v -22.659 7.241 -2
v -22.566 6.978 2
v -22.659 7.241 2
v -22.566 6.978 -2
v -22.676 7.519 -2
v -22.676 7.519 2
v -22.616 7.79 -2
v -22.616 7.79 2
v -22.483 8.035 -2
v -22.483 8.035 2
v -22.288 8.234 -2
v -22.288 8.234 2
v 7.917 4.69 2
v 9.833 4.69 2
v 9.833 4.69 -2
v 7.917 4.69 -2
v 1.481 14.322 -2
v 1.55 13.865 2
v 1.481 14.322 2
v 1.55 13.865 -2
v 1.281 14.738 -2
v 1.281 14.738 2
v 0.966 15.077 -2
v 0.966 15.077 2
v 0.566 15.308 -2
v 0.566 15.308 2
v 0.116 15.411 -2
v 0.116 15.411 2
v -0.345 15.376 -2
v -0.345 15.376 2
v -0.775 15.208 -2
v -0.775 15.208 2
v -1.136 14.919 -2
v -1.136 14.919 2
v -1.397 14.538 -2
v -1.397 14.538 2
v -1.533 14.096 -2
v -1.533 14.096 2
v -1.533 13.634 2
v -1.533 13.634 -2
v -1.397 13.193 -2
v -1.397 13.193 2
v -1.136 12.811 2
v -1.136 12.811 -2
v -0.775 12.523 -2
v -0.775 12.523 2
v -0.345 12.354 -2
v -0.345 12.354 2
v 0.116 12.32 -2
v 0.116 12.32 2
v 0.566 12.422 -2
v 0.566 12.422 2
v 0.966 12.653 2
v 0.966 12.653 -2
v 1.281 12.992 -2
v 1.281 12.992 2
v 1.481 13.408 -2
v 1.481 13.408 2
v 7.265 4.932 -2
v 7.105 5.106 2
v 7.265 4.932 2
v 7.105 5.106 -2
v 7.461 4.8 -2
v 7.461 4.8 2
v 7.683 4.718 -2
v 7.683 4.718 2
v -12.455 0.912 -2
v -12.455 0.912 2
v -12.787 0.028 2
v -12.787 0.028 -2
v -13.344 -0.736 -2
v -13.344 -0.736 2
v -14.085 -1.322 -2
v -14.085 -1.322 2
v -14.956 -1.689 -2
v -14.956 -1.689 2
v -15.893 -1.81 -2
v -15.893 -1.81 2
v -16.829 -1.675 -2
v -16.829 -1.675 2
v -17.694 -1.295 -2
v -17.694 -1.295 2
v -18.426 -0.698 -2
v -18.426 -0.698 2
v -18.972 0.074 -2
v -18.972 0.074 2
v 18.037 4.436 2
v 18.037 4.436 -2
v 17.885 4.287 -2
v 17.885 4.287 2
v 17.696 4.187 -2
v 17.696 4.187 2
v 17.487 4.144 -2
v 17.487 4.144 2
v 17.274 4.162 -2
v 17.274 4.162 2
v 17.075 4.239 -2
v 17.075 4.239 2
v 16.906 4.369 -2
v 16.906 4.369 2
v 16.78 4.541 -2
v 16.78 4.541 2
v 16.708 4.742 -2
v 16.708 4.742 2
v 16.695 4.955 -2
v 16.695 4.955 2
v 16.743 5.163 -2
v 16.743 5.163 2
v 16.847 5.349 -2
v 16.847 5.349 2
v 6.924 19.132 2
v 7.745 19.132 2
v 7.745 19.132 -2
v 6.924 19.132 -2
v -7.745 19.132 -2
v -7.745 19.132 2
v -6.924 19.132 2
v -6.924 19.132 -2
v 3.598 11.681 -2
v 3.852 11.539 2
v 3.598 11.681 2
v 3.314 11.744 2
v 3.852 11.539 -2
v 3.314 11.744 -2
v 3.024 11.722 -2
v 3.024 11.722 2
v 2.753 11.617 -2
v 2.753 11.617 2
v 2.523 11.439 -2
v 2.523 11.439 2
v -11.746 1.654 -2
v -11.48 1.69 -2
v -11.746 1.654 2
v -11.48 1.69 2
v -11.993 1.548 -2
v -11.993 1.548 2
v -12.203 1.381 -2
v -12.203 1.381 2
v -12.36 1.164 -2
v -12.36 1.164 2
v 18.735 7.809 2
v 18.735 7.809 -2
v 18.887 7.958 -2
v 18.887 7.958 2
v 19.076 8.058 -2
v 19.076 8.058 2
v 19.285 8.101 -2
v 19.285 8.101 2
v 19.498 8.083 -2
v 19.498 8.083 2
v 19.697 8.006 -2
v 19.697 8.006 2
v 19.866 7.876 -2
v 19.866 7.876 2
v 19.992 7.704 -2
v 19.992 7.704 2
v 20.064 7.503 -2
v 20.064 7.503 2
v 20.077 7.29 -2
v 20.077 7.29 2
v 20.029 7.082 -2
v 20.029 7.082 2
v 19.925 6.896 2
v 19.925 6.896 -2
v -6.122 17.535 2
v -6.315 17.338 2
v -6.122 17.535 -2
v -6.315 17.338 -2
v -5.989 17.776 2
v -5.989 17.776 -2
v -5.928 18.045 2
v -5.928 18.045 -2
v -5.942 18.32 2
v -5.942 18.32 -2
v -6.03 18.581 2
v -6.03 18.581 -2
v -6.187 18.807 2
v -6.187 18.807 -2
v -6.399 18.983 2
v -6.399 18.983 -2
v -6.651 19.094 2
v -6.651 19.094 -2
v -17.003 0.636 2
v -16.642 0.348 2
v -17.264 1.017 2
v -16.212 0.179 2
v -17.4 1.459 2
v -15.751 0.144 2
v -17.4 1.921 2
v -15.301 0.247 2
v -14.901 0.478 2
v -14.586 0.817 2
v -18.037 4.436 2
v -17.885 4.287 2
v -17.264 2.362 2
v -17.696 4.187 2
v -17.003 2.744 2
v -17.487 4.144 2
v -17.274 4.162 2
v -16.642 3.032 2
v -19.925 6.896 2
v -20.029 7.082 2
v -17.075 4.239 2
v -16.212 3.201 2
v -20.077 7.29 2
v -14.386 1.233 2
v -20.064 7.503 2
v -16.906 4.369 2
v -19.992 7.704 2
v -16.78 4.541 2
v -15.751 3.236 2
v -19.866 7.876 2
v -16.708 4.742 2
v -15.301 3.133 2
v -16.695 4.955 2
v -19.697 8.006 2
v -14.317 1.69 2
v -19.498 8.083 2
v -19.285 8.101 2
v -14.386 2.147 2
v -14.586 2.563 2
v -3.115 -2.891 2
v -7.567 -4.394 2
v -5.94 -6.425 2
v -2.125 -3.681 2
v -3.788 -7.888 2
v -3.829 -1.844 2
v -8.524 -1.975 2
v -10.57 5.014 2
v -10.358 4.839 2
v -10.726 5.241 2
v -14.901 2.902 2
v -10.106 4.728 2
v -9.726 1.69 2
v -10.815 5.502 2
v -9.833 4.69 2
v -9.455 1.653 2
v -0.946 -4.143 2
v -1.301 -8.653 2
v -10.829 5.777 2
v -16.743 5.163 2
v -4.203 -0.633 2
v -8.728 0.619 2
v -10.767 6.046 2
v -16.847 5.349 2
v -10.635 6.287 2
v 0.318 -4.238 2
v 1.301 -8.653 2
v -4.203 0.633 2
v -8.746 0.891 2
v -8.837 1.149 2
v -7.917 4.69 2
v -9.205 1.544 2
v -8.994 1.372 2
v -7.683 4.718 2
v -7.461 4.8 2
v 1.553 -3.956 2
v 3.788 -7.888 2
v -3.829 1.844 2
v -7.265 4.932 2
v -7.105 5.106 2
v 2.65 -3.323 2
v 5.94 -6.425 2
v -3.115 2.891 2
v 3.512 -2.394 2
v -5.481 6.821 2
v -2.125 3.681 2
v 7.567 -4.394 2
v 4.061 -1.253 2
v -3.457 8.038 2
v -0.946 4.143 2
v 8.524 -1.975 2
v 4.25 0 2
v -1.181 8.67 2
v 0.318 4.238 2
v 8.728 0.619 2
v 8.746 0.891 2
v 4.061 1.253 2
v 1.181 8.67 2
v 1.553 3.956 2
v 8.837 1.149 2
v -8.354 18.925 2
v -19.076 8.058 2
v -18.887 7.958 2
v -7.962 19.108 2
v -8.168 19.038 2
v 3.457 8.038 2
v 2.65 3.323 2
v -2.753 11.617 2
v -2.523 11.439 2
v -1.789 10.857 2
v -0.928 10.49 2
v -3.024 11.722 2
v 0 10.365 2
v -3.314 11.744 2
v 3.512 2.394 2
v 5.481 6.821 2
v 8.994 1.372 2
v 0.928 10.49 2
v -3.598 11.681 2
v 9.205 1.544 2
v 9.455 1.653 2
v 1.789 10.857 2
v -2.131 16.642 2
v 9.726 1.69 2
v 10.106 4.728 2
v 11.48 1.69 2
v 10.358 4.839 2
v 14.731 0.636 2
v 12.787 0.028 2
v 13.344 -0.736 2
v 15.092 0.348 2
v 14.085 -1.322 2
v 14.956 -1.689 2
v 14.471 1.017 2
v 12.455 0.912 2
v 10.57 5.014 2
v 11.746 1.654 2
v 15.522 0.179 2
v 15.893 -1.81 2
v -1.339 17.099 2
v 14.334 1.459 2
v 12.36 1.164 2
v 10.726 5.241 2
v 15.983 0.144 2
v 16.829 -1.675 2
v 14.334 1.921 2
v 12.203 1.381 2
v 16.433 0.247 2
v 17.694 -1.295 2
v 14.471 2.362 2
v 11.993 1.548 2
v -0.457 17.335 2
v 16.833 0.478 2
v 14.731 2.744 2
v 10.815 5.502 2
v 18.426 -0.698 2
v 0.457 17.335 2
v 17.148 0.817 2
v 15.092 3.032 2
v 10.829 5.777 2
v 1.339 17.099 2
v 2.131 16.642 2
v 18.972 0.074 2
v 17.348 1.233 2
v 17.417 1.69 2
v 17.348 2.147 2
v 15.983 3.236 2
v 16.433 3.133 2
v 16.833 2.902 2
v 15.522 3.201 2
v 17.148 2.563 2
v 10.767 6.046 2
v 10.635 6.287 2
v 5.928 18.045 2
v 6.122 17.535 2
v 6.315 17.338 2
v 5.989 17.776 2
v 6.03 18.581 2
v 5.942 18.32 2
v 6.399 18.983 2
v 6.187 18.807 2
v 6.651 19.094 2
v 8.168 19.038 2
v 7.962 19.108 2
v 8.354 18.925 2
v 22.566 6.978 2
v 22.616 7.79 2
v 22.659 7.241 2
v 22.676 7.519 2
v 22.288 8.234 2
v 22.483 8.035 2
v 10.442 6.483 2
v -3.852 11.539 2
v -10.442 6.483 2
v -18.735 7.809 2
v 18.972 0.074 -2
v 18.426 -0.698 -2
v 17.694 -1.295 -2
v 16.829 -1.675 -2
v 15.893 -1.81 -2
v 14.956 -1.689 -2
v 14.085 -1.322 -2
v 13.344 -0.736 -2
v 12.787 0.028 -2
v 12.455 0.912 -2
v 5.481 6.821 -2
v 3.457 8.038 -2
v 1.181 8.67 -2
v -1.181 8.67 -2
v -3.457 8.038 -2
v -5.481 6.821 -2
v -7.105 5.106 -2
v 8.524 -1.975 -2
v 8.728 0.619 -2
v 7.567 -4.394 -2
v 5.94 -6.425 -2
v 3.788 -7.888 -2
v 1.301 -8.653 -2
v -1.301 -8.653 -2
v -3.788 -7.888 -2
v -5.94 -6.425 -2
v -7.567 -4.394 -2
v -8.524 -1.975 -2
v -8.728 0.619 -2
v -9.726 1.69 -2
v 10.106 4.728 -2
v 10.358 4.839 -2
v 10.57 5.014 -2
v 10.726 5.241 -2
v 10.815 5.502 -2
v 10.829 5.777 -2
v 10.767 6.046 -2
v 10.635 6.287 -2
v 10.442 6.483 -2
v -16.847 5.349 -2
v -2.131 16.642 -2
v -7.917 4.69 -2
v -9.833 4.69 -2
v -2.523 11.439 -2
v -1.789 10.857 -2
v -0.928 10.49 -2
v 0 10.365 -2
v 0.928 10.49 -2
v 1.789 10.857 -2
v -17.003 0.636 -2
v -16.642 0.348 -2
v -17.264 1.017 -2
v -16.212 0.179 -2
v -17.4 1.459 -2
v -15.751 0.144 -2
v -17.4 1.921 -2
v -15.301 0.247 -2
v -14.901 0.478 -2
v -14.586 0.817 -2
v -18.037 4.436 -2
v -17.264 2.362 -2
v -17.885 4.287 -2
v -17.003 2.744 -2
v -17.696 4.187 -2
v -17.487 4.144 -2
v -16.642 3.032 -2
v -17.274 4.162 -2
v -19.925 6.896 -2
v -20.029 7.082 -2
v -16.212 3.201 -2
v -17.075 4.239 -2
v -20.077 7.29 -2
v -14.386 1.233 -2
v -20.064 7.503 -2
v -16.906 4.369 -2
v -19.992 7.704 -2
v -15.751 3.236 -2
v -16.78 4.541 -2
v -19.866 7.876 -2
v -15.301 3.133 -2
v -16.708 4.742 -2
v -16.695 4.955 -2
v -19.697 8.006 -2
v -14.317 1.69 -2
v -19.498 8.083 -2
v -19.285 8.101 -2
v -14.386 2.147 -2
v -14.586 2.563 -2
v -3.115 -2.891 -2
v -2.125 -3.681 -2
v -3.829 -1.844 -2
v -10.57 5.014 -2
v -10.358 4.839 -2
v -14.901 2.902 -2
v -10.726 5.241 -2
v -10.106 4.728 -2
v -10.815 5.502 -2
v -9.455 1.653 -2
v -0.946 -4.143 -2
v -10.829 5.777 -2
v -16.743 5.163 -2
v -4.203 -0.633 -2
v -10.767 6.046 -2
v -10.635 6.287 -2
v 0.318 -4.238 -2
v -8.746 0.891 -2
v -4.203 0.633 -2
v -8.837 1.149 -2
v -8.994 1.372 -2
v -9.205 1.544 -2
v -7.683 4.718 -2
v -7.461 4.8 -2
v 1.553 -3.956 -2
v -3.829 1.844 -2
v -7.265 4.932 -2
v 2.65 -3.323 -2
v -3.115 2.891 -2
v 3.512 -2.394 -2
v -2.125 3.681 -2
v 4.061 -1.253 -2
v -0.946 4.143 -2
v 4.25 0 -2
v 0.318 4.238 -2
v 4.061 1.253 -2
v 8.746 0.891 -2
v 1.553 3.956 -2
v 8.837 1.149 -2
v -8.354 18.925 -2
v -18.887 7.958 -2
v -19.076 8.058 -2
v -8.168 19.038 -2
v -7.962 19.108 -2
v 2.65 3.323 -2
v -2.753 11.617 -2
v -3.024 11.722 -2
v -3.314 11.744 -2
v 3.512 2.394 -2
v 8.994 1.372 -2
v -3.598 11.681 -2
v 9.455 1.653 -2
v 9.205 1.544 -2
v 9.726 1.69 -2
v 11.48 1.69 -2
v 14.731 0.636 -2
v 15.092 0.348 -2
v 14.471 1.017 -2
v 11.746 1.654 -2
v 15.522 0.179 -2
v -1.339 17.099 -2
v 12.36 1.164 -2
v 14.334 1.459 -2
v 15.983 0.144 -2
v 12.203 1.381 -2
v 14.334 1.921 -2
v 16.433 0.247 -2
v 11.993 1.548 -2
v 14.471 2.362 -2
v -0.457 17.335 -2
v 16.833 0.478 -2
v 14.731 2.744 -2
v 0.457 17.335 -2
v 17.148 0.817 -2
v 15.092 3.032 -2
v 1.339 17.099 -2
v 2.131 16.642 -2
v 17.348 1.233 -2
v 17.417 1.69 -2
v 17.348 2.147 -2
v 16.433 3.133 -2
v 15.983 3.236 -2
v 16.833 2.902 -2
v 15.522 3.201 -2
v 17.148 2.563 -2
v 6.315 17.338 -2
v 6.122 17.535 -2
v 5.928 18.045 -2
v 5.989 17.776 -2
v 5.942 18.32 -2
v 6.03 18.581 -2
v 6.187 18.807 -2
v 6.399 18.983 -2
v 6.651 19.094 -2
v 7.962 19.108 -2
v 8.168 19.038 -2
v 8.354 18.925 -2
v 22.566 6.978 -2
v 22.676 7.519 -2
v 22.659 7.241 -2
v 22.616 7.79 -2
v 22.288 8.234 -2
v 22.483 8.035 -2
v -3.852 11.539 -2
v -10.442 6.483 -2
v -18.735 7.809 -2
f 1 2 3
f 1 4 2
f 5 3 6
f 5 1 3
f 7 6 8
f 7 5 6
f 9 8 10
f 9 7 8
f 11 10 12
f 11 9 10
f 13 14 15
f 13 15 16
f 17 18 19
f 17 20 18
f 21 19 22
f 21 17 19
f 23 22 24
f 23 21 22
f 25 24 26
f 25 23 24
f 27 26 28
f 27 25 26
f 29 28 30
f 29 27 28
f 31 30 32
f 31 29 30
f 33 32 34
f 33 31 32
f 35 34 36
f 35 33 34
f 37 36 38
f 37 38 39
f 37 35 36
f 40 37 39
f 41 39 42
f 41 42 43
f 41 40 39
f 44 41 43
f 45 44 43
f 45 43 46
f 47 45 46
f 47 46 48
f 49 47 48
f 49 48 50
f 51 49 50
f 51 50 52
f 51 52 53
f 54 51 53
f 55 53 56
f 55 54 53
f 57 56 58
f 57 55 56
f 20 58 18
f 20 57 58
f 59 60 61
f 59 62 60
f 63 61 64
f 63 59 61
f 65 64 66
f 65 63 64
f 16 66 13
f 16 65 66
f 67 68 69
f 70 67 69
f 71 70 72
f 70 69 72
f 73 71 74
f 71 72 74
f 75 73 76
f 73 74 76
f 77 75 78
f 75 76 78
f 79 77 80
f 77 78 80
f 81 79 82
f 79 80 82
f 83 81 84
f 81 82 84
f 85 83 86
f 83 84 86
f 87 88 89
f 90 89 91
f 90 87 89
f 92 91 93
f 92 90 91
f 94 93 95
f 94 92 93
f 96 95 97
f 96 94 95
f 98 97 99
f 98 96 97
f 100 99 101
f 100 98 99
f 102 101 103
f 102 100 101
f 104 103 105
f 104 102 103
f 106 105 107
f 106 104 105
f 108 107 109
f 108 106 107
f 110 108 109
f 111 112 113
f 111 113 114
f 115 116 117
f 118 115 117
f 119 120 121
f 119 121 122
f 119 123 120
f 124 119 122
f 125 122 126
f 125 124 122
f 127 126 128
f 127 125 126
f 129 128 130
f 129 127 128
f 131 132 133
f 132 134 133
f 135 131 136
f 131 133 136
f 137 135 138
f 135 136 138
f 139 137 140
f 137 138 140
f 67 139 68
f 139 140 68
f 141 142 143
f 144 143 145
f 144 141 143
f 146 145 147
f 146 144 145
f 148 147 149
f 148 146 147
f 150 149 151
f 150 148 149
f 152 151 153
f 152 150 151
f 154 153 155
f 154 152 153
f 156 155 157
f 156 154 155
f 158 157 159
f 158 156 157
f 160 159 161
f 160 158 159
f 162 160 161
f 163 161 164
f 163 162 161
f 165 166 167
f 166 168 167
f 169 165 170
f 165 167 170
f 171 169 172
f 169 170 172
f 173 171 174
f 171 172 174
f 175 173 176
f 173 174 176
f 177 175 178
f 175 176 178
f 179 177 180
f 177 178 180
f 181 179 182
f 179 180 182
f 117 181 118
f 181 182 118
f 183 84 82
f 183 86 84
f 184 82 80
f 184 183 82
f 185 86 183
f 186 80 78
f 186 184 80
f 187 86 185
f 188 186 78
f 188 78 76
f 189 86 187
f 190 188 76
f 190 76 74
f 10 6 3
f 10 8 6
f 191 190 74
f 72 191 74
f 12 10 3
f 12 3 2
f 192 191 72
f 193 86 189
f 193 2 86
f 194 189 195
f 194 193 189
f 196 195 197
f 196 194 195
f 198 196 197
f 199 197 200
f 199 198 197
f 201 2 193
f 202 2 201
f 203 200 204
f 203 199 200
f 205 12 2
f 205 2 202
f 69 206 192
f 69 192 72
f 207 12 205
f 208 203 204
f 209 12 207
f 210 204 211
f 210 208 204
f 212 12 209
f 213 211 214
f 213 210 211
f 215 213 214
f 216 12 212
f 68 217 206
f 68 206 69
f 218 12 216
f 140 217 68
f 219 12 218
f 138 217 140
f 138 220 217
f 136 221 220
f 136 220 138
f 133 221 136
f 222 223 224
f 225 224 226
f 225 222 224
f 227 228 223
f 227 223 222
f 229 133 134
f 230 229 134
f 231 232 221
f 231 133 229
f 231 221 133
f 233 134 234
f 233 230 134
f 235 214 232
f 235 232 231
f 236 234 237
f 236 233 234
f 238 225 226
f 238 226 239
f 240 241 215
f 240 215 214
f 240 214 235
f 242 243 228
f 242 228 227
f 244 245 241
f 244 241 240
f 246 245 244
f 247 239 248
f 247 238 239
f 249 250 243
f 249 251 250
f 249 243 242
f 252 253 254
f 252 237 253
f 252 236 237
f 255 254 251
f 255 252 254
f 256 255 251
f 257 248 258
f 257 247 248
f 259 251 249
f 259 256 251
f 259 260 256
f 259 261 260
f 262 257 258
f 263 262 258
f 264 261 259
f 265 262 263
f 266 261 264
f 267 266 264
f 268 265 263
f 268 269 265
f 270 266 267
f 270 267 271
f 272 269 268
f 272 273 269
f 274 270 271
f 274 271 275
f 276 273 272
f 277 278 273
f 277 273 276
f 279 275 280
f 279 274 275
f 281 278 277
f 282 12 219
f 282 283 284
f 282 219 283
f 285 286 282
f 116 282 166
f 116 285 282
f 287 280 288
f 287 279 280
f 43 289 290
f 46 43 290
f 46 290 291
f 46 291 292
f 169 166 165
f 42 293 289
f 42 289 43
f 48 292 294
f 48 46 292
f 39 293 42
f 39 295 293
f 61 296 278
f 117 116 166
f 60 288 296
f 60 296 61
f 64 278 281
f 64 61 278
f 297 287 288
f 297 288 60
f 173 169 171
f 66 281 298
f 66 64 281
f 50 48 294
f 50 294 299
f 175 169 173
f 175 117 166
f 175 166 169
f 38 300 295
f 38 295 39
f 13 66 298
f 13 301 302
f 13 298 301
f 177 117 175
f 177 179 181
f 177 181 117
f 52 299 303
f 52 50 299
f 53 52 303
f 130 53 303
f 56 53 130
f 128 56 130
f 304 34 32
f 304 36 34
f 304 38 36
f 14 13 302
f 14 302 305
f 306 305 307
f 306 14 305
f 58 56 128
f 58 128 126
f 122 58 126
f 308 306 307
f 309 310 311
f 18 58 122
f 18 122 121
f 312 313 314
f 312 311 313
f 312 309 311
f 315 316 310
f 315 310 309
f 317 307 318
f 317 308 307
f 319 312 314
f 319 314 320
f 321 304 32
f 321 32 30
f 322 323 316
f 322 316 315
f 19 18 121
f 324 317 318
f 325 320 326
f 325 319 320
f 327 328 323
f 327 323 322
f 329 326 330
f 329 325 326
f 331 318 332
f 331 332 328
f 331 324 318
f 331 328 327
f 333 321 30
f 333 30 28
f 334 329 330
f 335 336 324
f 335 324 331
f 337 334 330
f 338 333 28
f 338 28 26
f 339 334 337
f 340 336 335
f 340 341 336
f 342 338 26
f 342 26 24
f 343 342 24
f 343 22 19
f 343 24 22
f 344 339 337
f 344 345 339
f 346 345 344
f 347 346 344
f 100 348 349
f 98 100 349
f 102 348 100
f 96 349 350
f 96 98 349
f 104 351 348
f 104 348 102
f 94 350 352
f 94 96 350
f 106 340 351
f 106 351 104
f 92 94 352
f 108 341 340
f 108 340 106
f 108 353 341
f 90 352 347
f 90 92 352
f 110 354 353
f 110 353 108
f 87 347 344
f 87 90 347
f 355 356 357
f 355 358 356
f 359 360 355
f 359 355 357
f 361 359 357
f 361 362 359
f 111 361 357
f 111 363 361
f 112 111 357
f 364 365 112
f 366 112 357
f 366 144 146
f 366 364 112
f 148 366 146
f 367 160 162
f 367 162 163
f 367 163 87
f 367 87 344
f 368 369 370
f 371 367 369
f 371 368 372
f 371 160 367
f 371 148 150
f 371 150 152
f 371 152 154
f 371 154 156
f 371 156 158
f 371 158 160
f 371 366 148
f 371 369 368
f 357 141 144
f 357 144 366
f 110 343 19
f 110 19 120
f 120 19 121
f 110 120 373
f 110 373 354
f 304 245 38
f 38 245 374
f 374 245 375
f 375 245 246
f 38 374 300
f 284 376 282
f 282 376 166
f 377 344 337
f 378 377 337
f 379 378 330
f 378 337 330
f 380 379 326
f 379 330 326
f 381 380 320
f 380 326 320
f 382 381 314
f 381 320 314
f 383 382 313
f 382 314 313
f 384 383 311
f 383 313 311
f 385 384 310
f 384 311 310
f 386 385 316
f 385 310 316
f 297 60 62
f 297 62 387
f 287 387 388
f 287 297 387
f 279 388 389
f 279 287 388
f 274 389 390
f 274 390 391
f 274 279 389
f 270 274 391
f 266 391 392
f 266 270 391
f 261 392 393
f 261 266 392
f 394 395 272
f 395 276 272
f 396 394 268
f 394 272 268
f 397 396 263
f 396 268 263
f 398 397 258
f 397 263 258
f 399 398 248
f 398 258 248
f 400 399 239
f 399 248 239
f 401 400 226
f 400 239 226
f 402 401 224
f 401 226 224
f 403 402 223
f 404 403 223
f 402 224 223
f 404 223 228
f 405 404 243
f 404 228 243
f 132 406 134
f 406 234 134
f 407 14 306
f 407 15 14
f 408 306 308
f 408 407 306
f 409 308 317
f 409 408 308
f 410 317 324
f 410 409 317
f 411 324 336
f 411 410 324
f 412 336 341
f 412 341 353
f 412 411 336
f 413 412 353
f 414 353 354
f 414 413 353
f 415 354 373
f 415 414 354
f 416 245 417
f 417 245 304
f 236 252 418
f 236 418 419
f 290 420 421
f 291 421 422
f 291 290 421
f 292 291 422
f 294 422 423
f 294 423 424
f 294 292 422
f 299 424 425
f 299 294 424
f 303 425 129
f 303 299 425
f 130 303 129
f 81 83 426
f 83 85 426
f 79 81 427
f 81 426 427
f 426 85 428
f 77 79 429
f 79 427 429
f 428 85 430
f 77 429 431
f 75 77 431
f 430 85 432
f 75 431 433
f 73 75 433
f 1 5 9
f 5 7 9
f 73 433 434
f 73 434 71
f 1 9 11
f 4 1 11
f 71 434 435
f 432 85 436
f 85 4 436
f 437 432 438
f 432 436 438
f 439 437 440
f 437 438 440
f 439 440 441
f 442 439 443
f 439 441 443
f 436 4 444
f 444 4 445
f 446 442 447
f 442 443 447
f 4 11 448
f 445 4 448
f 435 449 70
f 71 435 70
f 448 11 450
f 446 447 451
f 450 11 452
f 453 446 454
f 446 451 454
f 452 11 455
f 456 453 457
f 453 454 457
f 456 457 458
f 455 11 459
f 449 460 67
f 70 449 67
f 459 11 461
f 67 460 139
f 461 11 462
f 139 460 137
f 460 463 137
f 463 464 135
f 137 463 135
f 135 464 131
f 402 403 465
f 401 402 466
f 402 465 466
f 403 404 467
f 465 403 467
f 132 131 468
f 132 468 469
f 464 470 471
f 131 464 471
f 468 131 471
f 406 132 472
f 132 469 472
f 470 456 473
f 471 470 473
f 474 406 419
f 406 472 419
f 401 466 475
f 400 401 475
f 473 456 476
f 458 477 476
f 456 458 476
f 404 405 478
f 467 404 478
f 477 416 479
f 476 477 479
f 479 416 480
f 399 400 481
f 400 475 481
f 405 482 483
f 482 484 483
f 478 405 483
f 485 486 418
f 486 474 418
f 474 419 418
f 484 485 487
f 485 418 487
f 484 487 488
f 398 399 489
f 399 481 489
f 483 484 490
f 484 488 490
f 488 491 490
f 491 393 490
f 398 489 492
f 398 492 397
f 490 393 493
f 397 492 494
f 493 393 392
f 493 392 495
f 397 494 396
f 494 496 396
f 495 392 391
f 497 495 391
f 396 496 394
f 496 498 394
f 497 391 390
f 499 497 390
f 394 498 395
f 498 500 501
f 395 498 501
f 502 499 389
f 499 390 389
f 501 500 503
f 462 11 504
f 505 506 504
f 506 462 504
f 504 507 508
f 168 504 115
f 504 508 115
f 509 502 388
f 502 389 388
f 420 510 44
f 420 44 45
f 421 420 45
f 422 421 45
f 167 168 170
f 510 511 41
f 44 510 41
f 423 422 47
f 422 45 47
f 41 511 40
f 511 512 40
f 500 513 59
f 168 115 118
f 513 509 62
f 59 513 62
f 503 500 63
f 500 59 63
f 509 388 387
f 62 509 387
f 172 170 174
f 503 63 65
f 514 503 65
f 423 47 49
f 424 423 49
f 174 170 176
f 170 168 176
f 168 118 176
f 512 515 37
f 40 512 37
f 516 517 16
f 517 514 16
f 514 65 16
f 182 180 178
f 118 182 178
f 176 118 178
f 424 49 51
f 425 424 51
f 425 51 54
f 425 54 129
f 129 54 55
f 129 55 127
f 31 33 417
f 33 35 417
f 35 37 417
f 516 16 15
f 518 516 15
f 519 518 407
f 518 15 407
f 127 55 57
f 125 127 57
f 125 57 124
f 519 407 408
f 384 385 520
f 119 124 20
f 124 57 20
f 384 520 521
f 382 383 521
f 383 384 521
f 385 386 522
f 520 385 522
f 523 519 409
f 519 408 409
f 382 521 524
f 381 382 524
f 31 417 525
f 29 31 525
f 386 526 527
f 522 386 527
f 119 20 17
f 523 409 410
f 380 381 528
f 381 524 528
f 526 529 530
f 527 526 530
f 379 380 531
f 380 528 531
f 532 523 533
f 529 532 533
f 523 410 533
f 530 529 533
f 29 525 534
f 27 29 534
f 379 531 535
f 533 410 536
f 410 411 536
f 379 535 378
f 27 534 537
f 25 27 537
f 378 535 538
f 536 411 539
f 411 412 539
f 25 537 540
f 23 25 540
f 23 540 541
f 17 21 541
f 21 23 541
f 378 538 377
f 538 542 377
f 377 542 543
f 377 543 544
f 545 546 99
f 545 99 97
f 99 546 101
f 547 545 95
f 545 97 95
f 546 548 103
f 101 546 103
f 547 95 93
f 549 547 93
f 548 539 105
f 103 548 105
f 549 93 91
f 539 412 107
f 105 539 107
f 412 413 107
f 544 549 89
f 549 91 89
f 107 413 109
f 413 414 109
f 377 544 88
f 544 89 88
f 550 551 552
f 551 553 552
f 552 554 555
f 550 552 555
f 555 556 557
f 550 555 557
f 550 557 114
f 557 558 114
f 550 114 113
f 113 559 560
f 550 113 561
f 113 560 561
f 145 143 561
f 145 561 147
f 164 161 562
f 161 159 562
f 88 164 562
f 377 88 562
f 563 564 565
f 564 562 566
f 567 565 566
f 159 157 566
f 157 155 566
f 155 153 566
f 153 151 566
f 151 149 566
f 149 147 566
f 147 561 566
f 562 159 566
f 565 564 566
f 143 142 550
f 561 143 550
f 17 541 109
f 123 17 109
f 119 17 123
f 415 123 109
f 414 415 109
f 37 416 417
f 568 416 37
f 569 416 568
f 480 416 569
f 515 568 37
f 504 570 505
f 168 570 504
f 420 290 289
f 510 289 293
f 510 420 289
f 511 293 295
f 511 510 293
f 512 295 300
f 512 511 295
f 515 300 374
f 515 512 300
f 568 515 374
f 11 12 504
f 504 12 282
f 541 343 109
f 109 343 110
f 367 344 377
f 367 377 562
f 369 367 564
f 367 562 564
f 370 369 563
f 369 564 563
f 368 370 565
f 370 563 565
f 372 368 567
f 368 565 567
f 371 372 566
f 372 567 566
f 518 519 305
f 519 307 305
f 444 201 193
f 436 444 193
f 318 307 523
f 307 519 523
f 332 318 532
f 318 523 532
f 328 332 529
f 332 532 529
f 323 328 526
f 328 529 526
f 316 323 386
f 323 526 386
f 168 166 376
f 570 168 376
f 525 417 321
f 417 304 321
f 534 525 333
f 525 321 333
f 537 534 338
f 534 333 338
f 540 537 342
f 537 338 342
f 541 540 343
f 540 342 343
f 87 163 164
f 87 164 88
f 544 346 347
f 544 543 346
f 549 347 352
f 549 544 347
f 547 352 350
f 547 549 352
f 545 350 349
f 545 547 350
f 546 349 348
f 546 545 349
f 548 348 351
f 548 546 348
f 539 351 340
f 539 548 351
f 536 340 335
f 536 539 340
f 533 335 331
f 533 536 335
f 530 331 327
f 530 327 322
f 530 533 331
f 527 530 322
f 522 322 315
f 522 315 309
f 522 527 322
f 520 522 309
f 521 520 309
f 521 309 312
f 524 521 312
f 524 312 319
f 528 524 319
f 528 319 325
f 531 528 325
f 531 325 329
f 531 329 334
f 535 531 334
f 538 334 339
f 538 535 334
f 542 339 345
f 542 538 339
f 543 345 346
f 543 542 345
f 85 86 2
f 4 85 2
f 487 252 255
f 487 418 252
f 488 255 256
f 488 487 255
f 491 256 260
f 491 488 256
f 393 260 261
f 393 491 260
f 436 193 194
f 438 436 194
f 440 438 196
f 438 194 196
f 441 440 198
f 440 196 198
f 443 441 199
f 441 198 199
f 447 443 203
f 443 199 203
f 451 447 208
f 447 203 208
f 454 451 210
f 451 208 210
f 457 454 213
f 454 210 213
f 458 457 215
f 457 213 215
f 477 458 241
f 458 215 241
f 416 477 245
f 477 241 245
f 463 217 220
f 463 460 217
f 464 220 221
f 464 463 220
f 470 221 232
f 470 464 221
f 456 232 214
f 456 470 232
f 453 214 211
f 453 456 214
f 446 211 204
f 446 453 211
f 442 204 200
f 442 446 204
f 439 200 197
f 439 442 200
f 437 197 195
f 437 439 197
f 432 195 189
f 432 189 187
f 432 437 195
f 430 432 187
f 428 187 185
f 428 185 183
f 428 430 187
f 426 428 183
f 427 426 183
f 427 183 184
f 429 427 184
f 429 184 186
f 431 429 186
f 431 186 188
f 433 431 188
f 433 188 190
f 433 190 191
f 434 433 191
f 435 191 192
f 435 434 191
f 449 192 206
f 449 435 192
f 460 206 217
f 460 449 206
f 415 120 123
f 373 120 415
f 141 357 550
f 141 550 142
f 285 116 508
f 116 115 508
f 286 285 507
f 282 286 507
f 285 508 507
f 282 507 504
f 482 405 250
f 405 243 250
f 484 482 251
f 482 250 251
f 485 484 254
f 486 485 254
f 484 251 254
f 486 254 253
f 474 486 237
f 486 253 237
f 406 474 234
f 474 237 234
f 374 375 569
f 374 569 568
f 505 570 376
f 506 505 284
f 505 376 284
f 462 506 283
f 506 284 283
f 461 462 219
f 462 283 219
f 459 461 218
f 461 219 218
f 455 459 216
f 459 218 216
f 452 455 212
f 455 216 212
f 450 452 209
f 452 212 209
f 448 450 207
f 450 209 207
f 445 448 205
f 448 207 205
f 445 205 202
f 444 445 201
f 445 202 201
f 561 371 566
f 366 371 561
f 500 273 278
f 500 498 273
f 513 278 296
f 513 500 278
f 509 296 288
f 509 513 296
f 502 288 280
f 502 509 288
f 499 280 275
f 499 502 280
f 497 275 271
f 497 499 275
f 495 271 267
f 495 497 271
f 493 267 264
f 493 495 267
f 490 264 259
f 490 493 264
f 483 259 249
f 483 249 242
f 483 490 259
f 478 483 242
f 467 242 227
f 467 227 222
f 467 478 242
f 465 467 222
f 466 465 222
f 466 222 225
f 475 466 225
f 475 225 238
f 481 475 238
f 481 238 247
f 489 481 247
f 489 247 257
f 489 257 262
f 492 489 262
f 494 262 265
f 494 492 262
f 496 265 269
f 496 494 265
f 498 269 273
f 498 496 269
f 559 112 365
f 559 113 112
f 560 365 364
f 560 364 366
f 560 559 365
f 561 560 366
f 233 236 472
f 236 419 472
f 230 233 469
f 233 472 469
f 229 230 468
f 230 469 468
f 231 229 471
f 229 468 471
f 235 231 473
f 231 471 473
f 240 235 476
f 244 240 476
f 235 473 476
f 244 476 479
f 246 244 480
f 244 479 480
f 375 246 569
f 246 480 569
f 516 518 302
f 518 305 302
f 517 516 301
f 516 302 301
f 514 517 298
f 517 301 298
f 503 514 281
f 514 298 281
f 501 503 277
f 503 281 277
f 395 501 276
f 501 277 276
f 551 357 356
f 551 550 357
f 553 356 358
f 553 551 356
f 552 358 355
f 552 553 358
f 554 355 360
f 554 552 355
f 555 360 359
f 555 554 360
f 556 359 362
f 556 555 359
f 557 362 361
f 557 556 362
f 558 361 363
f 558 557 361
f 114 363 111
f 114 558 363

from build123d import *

# Parameters (mm, degrees)
SKETCH_1_R             = 4.25
SKETCH_1_R_2           = 1.55
EXTRUDE_1_DEPTH        = 2
FILLET_1_R             = 1
EXTRUDE_2_DEPTH        = 4
SKETCH_3_R             = 0.75
CUT_EXTRUDE_1_DEPTH    = 5
FILLET_2_R             = 1
FILLET_2_OF_MIRROR_1_R = 1
CUT_EXTRUDE_2_DEPTH    = 5
FILLET_3_R             = 1


with BuildPart() as part:
    # 草图1 → 凸台-拉伸1 (new body, symmetric)
    with BuildSketch(Plane.XY):
        with BuildLine():
            Line((-17.997731807, 4.466704665), (-2.130665002, 16.641933245))
            ThreePointArc((-2.130665002, 16.641933245), (0, 17.365196554), (2.130665002, 16.641933245))
            Line((2.130665002, 16.641933245), (17.997731807, 4.466704665))
            ThreePointArc((17.997731807, 4.466704665), (17.415077222, -1.449086621), (12.367066806, 1.689967974))
            Line((12.367066806, 1.689967974), (8.585249457, 1.689967974))
            ThreePointArc((8.585249457, 1.689967974), (0, -8.75), (-8.585249457, 1.689967974))
            Line((-8.585249457, 1.689967974), (-12.367066806, 1.689967974))
            ThreePointArc((-12.367066806, 1.689967974), (-17.415077222, -1.449086621), (-17.997731807, 4.466704665))
        make_face()
        Circle(SKETCH_1_R, mode=Mode.SUBTRACT)
        with Locations((-15.867066806, 1.689967974)):
            Circle(SKETCH_1_R_2, mode=Mode.SUBTRACT)
        with Locations((0, 13.865196554)):
            Circle(SKETCH_1_R_2, mode=Mode.SUBTRACT)
        with Locations((15.867066806, 1.689967974)):
            Circle(SKETCH_1_R_2, mode=Mode.SUBTRACT)
    extrude(amount=EXTRUDE_1_DEPTH, both=True)

    # 圆角1
    fillet_1_edges = [part.edges().sort_by_distance(p)[0] for p in [
        (12.367066806, 1.689967974, 0),
        (8.585249457, 1.689967974, 0),
        (-8.585249457, 1.689967974, 0),
        (-12.367066806, 1.689967974, 0),
    ]]
    fillet(fillet_1_edges, radius=FILLET_1_R)

    # 草图2 → 凸台-拉伸2 (add)
    with BuildSketch(Plane.XY.offset(2)):
        with BuildLine():
            Line((-18.971604722, 0.073847828), (-22.953372788, 7.722753116))
            Line((-22.953372788, 7.722753116), (-8.084856844, 19.131766671))
            Line((-8.084856844, 19.131766671), (-3.978157764, 19.131766671))
            Line((-3.978157764, 19.131766671), (-19.924559904, 6.895661948))
            Line((-19.924559904, 6.895661948), (-18.037399474, 4.436266594))
            Line((-18.037399474, 4.436266594), (-17.997731807, 4.466704665))
            ThreePointArc((-17.997731807, 4.466704665), (-19.284102831, 2.447506623), (-18.971604722, 0.073847828))
        make_face()
    extrude_2 = extrude(amount=-EXTRUDE_2_DEPTH)

    # 草图3 → 切除-拉伸1 (cut, through all)
    with BuildSketch(Plane.XY.offset(2)):
        with Locations((-19.329544899, 7.35223302)):
            Circle(SKETCH_3_R)
        with Locations((-17.442384469, 4.892837665)):
            Circle(SKETCH_3_R)
    cut_extrude_1 = extrude(amount=-CUT_EXTRUDE_1_DEPTH, mode=Mode.SUBTRACT)

    # 圆角2
    fillet_2_edges = [part.edges().sort_by_distance(p)[0] for p in [
        (-22.953372788, 7.722753116, 0),
        (-8.084856844, 19.131766671, 0),
        (-3.978157764, 19.131766671, 0),
    ]]
    fillet(fillet_2_edges, radius=FILLET_2_R)

    # 镜向1: 凸台-拉伸2, 切除-拉伸1 across plane
    add(extrude_2.mirror(Plane(origin=(0, 0, 0), x_dir=(0, 0, 1), z_dir=(1, 0, 0))))
    add(cut_extrude_1.mirror(Plane(origin=(0, 0, 0), x_dir=(0, 0, 1), z_dir=(1, 0, 0))), mode=Mode.SUBTRACT)

    # 圆角2 of 镜向1
    fillet_2_of_mirror_1_edges = [part.edges().sort_by_distance(p)[0] for p in [
        (22.953372788, 7.722753116, 0),
        (8.084856844, 19.131766671, 0),
        (3.978157764, 19.131766671, 0),
    ]]
    fillet(fillet_2_of_mirror_1_edges, radius=FILLET_2_OF_MIRROR_1_R)

    # 草图4 → 切除-拉伸2 (cut, through all)
    with BuildSketch(Plane.XY.offset(2)):
        with BuildLine():
            Line((-12.778730503, 4.689967974), (-3.052637302, 12.153061775))
            ThreePointArc((-3.052637302, 12.153061775), (0, 10.365196554), (3.052637302, 12.153061775))
            Line((3.052637302, 12.153061775), (12.778730503, 4.689967974))
            Line((12.778730503, 4.689967974), (7.38692767, 4.689967974))
            ThreePointArc((7.38692767, 4.689967974), (0, 8.75), (-7.38692767, 4.689967974))
            Line((-7.38692767, 4.689967974), (-12.778730503, 4.689967974))
        make_face()
    extrude(amount=-CUT_EXTRUDE_2_DEPTH, mode=Mode.SUBTRACT)

    # 圆角3
    fillet_3_edges = [part.edges().sort_by_distance(p)[0] for p in [
        (-7.38692767, 4.689967974, 0),
        (-12.778730503, 4.689967974, 0),
        (-3.052637302, 12.153061775, 0),
        (3.052637302, 12.153061775, 0),
        (12.778730503, 4.689967974, 0),
        (7.38692767, 4.689967974, 0),
    ]]
    fillet(fillet_3_edges, radius=FILLET_3_R)


solid = part.part
